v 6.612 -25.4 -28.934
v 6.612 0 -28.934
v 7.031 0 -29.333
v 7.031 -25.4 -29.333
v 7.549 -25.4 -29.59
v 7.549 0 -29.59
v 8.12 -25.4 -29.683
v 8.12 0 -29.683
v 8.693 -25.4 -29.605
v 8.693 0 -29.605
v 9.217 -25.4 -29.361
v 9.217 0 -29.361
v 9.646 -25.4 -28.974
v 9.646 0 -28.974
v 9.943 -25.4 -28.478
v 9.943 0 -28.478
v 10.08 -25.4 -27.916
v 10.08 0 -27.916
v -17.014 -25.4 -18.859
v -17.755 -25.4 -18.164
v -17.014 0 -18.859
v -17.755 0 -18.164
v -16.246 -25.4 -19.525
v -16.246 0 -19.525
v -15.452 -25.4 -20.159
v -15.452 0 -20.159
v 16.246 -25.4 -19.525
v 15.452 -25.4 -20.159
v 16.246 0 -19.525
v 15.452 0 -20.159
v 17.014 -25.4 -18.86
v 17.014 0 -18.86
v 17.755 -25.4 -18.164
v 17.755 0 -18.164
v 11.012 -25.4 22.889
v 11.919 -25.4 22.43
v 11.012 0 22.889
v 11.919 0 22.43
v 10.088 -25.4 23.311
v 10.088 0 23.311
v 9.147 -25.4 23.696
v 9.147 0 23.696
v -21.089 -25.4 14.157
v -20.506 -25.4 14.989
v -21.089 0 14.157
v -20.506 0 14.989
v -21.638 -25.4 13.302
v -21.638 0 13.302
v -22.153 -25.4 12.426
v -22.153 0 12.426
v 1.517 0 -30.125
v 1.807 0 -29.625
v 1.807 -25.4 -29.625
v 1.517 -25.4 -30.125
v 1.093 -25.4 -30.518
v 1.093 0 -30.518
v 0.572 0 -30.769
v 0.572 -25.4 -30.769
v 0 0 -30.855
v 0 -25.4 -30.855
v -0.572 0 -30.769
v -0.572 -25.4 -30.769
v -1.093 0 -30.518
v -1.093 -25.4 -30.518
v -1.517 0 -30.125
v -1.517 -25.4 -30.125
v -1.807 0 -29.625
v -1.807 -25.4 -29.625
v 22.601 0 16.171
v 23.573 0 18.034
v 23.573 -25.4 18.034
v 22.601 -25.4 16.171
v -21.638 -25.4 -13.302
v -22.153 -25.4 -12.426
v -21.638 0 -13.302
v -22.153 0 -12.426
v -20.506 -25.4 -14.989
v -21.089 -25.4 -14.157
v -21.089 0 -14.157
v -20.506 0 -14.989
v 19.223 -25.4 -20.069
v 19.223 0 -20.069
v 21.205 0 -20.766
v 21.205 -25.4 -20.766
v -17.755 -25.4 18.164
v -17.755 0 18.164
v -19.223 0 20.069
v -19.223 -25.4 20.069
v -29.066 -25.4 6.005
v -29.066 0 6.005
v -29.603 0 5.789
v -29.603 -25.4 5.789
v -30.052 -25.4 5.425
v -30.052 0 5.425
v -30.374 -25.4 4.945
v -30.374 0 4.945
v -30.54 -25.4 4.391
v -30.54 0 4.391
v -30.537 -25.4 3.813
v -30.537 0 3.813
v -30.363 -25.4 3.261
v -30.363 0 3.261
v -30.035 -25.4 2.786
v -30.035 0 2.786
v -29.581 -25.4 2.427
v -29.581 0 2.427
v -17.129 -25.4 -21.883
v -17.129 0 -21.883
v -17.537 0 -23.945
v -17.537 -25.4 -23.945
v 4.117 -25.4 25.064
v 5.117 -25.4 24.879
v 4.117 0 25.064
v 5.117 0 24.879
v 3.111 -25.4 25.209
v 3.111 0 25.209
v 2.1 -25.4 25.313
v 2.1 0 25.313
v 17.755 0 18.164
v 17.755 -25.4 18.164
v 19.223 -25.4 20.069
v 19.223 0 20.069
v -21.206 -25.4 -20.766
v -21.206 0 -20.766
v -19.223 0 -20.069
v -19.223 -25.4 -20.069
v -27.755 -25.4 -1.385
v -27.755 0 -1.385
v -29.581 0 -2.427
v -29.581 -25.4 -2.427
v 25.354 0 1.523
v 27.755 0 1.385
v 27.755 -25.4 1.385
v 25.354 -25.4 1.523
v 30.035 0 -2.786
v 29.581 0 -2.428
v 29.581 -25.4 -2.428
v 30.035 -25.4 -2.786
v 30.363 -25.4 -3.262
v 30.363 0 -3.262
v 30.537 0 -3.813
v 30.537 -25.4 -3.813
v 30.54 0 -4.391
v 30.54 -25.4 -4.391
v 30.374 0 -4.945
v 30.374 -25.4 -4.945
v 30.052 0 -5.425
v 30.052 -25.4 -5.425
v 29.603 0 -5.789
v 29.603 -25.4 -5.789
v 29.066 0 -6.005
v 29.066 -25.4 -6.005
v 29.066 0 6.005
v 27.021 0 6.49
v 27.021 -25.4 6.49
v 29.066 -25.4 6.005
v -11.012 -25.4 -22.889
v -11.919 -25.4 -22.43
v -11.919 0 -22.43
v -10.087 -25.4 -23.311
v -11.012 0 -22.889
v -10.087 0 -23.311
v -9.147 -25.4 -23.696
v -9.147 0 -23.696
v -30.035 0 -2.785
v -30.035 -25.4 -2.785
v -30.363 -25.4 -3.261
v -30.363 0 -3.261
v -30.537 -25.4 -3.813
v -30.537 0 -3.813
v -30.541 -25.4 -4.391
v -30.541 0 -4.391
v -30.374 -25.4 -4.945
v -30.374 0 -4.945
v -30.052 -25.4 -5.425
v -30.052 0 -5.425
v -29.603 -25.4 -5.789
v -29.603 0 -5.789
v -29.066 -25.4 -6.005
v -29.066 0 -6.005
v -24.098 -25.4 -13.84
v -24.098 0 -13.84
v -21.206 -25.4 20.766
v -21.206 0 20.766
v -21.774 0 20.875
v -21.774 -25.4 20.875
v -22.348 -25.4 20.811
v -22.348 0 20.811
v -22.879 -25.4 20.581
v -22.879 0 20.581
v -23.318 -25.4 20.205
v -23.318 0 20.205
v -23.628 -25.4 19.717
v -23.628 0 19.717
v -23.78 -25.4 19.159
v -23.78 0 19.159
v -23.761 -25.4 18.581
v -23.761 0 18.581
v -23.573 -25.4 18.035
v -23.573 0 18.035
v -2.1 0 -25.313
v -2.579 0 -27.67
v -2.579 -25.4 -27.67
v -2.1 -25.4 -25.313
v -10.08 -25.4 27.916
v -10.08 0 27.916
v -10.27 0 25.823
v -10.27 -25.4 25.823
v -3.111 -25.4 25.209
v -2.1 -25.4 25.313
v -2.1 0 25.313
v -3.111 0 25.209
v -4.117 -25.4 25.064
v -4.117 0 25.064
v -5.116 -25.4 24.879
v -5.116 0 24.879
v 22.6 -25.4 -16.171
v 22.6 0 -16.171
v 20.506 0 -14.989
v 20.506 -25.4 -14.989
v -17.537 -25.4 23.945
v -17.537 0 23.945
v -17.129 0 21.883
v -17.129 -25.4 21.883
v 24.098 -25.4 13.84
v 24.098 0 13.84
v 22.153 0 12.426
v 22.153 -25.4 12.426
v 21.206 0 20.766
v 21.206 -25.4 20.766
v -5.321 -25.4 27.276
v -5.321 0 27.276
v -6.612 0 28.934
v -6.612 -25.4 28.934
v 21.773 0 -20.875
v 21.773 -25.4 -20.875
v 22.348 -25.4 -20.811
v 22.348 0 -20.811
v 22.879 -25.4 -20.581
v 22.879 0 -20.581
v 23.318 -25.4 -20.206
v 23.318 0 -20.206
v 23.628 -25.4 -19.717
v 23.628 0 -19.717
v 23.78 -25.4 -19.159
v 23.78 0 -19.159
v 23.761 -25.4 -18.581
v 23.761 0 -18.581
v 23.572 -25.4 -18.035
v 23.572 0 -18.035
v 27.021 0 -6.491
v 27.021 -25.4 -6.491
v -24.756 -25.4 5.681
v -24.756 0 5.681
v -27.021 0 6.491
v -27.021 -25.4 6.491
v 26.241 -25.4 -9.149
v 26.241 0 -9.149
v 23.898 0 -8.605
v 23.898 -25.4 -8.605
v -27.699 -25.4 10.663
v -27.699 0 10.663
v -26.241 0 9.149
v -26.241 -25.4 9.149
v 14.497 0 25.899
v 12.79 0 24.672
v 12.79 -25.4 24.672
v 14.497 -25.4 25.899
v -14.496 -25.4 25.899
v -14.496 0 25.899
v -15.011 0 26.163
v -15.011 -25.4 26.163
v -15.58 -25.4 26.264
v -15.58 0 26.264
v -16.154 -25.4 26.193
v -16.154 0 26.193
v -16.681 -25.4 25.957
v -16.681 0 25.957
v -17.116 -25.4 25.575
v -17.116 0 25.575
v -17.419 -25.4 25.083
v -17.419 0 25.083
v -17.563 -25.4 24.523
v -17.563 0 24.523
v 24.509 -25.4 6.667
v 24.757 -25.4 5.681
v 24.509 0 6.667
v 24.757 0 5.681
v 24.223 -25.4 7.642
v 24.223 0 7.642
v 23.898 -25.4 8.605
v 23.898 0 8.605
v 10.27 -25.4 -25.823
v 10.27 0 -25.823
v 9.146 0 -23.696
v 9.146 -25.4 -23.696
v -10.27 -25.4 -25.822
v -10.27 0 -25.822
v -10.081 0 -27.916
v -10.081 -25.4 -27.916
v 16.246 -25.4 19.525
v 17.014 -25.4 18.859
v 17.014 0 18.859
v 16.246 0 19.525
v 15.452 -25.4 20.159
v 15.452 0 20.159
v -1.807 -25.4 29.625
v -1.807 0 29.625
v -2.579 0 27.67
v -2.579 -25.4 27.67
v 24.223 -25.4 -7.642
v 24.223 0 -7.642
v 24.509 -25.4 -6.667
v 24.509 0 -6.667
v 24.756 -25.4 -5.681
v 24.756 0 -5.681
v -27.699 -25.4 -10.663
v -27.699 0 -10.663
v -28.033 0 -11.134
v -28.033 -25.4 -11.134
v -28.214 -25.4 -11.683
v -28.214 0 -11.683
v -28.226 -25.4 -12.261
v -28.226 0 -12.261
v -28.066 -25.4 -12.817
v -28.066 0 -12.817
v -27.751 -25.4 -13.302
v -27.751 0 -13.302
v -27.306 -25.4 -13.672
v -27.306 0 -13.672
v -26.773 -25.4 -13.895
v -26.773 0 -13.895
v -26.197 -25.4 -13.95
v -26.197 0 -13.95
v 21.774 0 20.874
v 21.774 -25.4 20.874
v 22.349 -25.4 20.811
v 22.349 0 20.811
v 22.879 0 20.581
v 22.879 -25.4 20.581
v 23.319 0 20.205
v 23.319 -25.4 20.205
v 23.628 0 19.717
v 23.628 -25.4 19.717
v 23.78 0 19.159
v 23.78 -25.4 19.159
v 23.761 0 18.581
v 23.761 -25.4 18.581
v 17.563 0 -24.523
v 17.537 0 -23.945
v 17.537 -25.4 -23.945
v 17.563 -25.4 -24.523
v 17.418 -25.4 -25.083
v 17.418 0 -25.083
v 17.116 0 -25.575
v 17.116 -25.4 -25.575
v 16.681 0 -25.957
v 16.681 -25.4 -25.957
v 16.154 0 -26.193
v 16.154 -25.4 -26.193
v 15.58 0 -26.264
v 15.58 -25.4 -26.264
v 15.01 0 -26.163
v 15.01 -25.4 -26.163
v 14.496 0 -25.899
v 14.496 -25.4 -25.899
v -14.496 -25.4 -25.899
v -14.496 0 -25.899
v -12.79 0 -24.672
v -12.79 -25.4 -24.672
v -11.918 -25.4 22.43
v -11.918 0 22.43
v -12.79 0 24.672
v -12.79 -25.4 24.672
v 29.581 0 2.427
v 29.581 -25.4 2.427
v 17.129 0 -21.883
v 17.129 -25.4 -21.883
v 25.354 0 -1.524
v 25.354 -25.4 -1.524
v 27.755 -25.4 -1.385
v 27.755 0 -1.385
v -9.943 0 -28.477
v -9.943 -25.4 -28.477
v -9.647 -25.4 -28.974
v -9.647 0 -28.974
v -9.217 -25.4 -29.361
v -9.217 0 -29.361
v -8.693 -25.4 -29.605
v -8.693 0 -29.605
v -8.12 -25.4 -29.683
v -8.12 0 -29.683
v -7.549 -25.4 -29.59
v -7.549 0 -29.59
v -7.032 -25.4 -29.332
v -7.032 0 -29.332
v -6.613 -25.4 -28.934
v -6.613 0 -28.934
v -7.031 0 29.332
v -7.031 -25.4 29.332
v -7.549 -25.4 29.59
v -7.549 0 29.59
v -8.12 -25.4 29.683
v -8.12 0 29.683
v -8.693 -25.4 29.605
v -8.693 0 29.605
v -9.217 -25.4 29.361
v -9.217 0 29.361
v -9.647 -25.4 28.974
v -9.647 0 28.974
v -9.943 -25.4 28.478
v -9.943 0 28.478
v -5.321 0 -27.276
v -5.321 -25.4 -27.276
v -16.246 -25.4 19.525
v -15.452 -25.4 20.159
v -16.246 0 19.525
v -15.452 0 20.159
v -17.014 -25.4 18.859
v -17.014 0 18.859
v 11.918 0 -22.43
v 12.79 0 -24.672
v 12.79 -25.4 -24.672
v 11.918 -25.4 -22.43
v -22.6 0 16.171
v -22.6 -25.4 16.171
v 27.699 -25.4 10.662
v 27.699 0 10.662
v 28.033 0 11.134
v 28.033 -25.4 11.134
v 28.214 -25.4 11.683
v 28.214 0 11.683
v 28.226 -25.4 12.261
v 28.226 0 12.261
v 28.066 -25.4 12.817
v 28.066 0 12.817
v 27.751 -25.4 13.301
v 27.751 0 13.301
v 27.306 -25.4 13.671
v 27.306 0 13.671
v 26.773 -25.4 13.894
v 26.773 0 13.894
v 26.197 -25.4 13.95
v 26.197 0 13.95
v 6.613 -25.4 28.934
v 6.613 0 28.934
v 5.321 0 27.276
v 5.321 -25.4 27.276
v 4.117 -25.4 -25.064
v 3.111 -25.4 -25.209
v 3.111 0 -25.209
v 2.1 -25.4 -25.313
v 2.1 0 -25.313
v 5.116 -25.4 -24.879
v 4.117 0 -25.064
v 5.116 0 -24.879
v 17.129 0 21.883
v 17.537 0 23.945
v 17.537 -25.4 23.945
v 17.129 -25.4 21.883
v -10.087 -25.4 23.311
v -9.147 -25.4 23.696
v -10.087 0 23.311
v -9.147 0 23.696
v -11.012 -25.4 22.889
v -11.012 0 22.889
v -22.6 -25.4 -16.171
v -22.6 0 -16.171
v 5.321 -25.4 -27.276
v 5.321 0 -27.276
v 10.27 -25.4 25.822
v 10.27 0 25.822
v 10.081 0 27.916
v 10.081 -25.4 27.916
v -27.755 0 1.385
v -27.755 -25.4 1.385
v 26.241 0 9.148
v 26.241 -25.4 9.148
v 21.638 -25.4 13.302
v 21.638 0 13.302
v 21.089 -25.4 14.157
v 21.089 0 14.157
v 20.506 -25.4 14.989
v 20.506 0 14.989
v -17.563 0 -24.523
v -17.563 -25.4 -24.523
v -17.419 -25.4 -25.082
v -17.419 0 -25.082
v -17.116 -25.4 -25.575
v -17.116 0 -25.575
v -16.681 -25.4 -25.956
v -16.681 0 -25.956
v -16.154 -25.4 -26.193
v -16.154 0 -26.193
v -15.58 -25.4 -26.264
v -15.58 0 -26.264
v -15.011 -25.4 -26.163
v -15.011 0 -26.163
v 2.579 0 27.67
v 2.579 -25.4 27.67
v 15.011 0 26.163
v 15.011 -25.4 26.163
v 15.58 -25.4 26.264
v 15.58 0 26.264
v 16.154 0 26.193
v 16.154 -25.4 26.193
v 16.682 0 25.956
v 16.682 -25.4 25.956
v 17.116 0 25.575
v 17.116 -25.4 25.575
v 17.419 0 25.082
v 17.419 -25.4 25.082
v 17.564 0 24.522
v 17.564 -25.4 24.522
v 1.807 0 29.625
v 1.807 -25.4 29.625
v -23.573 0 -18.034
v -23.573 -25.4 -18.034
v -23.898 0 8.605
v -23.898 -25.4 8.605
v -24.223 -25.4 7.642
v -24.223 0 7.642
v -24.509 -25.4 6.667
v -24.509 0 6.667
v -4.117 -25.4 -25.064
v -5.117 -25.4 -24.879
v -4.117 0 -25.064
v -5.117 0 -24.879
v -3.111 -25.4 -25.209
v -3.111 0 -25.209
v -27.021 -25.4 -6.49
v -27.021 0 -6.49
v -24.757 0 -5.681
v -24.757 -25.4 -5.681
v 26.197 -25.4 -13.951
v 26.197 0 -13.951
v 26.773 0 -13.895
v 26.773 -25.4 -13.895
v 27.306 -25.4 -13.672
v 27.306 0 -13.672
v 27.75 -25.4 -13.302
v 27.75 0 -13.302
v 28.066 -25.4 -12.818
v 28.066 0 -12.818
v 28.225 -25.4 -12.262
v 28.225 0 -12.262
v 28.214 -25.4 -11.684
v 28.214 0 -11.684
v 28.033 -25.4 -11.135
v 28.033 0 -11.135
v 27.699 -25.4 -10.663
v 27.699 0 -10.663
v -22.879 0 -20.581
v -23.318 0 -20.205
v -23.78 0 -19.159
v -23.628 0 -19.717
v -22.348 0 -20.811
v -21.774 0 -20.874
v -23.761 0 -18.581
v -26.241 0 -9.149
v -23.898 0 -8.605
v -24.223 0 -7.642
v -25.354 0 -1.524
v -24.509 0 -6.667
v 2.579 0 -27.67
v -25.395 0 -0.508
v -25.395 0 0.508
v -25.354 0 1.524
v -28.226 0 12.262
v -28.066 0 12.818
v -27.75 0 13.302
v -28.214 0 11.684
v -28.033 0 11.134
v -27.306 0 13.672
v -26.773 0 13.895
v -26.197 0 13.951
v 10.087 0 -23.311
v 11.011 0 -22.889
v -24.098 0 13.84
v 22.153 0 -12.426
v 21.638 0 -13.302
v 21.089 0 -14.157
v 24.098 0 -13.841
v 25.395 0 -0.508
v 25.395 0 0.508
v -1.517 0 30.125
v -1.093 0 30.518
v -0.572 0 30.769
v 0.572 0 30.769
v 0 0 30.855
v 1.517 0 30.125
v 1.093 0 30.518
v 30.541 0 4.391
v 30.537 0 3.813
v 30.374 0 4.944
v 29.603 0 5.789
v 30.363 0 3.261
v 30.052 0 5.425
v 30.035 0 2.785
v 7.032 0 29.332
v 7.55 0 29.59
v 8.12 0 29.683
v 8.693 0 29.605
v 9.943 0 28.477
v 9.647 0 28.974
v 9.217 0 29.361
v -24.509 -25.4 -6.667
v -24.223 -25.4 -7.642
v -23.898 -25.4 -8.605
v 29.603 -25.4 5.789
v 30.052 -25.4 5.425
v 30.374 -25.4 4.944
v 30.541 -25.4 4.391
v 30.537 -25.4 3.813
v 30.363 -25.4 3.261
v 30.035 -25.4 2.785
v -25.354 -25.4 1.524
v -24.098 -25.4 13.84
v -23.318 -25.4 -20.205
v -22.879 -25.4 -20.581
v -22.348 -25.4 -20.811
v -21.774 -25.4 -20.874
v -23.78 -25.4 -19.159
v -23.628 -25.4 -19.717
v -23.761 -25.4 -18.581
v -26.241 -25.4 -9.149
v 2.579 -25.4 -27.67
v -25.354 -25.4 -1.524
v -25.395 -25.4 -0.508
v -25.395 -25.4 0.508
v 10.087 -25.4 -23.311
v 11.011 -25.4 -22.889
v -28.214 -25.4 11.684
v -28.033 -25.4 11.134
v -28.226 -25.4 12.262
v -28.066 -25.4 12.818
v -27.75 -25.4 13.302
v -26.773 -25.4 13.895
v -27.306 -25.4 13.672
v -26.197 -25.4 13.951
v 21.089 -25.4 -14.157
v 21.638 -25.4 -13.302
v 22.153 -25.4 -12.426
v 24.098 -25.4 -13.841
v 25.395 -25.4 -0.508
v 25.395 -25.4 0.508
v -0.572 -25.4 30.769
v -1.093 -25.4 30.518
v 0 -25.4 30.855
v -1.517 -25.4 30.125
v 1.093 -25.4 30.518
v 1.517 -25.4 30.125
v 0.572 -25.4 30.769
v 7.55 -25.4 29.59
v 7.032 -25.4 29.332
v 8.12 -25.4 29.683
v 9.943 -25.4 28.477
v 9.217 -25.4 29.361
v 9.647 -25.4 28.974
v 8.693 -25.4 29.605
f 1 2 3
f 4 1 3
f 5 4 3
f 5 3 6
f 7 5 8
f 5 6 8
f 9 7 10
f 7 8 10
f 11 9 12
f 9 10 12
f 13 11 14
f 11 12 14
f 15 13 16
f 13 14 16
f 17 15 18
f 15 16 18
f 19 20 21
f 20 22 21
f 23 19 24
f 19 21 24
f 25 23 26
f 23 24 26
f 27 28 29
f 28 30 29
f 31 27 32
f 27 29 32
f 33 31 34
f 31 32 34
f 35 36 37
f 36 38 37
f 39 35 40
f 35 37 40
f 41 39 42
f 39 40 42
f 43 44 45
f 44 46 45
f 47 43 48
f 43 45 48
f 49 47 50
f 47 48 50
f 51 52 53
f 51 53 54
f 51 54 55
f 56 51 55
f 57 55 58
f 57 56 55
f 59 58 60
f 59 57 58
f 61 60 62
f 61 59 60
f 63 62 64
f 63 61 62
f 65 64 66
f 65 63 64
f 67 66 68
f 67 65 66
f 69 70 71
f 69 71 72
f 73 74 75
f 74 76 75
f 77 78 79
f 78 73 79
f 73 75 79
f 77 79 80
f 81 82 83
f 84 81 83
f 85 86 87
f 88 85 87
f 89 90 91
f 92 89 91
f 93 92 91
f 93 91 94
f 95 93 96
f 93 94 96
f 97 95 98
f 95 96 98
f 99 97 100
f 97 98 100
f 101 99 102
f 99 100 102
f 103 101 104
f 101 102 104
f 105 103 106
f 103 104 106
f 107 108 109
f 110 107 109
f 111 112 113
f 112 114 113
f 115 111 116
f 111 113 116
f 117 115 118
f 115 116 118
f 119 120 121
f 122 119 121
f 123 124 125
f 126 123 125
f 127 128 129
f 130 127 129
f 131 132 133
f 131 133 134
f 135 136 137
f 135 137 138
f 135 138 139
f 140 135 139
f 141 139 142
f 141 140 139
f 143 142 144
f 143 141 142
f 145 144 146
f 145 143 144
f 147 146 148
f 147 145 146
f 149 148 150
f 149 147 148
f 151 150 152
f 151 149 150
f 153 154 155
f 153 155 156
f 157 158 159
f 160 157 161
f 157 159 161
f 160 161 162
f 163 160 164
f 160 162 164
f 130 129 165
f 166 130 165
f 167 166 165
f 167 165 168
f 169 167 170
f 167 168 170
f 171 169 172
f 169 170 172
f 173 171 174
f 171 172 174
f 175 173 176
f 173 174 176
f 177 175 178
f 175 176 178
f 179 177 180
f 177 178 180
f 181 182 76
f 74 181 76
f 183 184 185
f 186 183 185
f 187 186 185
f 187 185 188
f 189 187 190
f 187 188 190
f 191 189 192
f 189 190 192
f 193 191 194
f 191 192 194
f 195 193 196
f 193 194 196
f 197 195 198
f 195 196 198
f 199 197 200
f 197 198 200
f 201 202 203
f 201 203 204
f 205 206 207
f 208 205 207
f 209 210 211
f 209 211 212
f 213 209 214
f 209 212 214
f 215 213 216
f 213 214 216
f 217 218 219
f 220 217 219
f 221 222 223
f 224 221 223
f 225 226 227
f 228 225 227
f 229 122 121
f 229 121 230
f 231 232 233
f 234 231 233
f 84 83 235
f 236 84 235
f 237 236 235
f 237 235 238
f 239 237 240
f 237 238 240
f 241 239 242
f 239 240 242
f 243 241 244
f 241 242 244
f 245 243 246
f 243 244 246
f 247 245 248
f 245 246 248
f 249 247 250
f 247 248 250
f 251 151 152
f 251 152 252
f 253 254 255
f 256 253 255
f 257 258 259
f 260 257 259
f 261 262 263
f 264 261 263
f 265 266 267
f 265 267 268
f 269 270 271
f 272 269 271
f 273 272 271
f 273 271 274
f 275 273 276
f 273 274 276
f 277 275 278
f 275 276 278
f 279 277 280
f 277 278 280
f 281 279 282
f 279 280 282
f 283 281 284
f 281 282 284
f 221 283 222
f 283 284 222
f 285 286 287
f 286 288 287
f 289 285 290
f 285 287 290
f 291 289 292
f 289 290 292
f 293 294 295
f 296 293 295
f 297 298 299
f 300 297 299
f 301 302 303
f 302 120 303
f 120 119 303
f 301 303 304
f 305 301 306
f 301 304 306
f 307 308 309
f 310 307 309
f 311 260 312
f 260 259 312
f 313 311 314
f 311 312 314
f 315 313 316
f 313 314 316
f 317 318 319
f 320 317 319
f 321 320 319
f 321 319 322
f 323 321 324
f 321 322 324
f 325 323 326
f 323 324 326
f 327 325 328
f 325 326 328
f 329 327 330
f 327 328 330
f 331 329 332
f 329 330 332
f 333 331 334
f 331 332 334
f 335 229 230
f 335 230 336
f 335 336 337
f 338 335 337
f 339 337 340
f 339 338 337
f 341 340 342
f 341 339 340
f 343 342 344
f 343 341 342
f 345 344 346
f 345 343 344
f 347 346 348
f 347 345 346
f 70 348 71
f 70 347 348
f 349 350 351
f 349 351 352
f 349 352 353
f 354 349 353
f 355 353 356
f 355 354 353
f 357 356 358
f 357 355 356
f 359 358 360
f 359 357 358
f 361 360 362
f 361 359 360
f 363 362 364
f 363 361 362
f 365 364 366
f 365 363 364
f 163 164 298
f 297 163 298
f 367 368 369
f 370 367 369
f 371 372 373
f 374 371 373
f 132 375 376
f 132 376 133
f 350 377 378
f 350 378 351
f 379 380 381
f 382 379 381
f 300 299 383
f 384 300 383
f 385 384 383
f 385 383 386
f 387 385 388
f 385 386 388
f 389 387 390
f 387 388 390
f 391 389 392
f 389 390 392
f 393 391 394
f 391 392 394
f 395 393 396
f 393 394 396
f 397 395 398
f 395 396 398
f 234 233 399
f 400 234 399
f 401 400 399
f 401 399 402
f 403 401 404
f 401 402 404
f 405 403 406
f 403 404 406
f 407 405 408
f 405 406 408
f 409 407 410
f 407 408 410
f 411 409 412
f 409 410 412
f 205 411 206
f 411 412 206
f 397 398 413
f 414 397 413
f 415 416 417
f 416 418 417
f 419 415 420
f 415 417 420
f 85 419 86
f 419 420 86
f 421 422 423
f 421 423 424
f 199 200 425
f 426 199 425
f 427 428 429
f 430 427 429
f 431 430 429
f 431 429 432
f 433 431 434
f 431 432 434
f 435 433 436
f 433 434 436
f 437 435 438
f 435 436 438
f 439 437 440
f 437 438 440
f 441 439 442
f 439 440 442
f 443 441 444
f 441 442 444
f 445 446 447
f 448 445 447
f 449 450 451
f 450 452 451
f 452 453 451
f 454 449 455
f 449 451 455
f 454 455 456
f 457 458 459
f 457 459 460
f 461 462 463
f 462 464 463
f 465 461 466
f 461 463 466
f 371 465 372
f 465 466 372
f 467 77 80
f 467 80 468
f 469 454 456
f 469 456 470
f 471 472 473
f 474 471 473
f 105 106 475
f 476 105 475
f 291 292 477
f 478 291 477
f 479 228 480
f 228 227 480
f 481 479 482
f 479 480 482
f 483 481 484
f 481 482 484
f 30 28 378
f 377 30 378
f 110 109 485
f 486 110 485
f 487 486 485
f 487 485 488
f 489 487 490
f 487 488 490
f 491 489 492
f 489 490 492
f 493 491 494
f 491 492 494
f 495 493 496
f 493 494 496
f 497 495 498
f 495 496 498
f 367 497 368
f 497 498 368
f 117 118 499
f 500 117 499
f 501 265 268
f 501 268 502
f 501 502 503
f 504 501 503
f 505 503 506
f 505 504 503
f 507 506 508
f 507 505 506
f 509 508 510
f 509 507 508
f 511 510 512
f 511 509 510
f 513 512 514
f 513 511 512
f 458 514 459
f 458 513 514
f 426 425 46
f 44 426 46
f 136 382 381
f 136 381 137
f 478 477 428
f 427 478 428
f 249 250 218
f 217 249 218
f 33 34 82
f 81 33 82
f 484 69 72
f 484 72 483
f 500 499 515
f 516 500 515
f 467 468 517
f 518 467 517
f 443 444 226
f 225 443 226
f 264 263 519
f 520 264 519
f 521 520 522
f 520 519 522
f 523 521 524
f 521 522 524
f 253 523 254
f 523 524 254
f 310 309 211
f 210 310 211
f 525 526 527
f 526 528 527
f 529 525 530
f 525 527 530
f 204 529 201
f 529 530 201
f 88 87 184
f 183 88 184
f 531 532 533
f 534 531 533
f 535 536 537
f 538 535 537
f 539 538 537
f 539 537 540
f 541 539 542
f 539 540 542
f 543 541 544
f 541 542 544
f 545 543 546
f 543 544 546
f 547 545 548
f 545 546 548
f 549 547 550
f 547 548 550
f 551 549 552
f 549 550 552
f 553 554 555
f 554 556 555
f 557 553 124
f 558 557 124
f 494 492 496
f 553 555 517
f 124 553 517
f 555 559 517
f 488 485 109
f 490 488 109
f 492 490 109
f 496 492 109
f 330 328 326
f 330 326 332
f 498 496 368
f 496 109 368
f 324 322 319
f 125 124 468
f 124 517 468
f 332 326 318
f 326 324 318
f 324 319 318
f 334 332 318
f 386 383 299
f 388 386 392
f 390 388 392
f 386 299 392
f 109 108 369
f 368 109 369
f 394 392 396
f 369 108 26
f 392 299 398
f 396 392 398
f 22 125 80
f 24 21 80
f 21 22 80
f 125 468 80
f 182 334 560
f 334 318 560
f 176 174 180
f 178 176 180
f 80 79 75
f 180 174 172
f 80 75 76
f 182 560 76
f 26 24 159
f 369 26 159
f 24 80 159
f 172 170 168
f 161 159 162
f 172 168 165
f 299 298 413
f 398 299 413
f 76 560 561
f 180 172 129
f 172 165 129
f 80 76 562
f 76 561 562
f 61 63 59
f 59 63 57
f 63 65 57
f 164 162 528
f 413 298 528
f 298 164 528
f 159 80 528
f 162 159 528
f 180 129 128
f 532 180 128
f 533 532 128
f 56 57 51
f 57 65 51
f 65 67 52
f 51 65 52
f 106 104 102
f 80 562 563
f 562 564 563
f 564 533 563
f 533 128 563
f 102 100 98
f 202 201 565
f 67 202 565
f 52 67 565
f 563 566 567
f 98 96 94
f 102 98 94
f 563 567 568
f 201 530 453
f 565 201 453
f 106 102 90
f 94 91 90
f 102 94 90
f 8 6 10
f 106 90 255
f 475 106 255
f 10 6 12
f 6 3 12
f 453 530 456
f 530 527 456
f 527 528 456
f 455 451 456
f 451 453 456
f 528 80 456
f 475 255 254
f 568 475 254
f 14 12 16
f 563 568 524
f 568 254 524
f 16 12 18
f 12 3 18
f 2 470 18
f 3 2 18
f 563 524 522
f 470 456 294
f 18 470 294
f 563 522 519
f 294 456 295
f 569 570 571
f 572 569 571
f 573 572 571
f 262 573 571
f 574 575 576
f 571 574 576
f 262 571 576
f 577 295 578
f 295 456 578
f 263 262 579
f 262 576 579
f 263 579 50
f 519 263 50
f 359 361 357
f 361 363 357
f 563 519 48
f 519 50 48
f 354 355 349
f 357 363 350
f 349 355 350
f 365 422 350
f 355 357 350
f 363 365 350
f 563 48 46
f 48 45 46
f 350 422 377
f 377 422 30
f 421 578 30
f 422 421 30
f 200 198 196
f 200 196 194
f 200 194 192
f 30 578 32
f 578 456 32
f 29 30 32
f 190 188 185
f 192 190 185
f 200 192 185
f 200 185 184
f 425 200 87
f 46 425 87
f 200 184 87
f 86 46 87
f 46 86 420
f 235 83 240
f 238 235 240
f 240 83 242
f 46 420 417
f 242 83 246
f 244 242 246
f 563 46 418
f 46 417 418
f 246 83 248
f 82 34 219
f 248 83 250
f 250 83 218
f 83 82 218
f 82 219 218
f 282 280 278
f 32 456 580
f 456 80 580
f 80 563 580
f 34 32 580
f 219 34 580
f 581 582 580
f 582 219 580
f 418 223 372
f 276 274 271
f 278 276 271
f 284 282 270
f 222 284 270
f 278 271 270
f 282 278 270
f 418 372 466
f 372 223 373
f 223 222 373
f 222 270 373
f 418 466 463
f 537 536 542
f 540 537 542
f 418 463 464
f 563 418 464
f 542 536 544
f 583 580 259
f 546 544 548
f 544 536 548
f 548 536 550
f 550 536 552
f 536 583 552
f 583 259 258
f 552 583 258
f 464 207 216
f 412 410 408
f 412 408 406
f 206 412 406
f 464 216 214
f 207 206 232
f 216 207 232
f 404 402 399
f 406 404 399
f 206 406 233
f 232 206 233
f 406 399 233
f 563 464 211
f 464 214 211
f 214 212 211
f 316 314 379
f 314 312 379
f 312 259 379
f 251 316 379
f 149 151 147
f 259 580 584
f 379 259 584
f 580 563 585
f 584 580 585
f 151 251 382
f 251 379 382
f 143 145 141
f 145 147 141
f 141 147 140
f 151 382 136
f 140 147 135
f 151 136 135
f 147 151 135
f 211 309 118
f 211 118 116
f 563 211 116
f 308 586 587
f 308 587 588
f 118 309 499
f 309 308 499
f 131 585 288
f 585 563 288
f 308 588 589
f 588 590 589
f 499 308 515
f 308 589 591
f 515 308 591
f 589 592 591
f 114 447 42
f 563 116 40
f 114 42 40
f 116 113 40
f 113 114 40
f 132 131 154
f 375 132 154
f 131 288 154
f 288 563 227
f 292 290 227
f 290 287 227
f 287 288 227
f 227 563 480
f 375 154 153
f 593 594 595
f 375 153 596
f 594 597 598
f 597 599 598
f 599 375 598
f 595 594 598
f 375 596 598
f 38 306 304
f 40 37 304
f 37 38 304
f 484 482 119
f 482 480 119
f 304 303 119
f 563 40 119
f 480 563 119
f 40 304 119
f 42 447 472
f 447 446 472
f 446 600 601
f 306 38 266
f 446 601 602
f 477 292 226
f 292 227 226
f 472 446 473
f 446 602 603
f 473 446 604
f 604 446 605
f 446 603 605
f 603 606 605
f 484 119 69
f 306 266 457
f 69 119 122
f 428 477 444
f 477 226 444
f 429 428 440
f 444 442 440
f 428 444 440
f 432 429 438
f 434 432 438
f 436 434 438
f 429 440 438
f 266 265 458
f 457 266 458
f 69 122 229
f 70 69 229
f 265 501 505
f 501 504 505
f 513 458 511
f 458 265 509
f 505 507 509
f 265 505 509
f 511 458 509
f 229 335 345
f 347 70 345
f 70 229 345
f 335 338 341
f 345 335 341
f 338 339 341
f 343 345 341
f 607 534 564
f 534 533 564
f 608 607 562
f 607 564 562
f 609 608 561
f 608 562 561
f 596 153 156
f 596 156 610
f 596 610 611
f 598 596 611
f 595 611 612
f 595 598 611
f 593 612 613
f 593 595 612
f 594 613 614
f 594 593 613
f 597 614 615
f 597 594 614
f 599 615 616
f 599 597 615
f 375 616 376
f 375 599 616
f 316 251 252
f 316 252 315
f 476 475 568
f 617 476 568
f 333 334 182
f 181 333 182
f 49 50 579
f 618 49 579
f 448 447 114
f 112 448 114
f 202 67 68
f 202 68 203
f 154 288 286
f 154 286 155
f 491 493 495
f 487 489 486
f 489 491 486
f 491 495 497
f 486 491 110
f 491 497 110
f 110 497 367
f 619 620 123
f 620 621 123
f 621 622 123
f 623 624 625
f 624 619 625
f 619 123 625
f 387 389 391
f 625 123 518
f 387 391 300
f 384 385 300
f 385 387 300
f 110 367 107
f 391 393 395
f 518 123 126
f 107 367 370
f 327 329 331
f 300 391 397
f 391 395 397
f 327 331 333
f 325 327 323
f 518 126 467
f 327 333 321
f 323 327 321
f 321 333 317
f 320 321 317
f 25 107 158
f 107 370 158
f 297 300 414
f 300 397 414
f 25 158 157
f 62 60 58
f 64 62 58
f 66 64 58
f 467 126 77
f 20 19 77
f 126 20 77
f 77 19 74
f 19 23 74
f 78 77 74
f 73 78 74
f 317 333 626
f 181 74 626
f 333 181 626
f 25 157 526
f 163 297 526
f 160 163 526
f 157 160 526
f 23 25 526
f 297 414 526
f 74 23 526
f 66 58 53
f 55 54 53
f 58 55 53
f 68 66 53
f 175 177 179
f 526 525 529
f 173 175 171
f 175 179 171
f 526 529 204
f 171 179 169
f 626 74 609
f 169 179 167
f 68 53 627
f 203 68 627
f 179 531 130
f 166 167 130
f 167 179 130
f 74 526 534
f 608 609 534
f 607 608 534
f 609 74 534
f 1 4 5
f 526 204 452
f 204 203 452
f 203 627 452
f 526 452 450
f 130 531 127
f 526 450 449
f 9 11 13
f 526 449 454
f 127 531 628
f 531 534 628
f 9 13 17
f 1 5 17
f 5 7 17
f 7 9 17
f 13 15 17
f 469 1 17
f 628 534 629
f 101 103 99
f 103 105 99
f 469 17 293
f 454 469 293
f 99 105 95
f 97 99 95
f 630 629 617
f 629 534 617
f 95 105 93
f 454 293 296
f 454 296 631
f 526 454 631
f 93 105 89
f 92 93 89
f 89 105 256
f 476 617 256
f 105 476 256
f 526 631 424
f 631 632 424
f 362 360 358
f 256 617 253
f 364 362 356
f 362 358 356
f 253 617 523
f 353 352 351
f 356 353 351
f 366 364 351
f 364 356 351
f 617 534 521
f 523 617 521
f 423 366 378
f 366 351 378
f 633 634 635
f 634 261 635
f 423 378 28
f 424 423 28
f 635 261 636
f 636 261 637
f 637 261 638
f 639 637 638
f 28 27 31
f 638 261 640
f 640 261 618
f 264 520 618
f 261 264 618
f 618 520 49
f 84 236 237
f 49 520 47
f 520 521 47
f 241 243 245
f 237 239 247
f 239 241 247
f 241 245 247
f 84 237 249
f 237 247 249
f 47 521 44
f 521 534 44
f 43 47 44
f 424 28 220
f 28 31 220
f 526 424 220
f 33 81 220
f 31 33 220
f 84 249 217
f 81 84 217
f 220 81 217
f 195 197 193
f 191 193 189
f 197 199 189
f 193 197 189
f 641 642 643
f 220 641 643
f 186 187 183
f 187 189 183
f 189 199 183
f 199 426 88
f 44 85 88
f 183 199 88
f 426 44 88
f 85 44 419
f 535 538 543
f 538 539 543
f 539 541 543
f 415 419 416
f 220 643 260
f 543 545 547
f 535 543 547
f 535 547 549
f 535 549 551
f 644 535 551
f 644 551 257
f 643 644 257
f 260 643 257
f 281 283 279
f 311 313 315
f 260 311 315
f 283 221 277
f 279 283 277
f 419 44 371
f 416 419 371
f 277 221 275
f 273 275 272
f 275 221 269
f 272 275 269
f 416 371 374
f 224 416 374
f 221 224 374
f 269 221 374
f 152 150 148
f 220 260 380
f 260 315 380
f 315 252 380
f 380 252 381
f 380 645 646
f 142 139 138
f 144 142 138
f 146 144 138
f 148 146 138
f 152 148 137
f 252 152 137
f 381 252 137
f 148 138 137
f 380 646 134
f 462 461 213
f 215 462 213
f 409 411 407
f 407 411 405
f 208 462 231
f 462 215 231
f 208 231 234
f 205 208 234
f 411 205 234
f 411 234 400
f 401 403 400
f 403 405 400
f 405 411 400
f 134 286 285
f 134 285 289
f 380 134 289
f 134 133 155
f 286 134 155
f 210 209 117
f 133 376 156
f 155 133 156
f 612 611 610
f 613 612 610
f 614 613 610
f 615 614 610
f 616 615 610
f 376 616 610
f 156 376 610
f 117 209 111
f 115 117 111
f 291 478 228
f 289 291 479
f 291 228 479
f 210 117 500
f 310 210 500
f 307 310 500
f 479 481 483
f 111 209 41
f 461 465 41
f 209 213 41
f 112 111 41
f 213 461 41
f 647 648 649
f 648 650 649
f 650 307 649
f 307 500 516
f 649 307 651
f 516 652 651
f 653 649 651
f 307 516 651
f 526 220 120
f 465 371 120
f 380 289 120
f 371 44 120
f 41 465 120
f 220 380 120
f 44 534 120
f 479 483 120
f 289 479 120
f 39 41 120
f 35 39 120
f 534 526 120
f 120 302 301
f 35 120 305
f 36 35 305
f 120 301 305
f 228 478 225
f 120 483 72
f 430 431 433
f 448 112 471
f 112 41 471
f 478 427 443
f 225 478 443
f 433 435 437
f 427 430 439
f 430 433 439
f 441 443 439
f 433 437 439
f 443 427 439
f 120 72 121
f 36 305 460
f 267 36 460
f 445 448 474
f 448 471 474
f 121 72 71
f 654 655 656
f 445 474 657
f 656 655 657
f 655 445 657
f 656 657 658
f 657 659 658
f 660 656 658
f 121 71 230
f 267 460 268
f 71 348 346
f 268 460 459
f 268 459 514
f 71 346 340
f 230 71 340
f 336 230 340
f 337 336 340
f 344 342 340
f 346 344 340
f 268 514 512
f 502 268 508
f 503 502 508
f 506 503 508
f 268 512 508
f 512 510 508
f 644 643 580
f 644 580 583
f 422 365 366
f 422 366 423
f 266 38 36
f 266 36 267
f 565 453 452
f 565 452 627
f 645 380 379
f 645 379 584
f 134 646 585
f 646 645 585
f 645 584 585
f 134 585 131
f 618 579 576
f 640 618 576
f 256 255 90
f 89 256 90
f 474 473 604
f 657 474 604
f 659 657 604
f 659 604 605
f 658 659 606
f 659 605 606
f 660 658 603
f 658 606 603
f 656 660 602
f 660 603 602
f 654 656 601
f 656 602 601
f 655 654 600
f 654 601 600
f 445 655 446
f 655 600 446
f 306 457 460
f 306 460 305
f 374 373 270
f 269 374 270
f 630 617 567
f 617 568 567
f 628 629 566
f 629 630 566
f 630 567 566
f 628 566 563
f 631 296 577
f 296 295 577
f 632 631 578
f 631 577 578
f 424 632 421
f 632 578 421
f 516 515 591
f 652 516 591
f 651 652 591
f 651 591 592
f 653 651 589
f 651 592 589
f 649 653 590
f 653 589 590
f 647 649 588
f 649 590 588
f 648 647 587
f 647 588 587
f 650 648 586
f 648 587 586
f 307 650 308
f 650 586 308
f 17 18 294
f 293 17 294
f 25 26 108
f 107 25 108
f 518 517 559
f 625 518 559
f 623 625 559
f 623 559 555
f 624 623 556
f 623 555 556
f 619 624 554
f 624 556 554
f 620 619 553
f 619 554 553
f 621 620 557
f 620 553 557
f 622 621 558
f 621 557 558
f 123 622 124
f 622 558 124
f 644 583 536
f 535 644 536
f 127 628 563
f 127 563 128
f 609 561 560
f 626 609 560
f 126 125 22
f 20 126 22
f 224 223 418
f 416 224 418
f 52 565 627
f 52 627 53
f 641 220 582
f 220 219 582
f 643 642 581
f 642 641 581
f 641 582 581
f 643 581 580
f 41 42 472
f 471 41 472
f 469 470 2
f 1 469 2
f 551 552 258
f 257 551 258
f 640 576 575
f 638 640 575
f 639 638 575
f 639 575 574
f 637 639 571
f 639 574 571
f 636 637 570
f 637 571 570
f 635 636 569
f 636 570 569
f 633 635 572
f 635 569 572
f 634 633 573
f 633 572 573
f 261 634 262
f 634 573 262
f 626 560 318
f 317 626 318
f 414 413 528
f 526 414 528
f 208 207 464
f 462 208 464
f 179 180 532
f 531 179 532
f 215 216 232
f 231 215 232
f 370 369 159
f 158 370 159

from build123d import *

# Parameters (mm, degrees)
F0_R             = 25.4
F1_DEPTH         = 25.4
F4_DEPTH         = 25.4
F4_COPIES_COUNT  = 8
F4_COPIES_ANGLE  = 343.6356
F4_COPIES1_COUNT = 3
F4_COPIES1_ANGLE = 32.7272727273
F4_COPIES2_COUNT = 3
F4_COPIES2_ANGLE = 130.9088
F4_COPIES3_COUNT = 3
F4_COPIES3_ANGLE = 163.636
F4_COPIES4_COUNT = 3
F4_COPIES4_ANGLE = 229.0904


# Not quite as in the source:
# - a pattern or mirror of a feature is missing from the dataset's text; its kind, count and spacing are read off the source's solid


with BuildPart() as f1:
    # F0 (on Front) → F1 (new body)
    with BuildSketch(Plane.XZ):
        Circle(F0_R)
    extrude(amount=F1_DEPTH)

    # F3 (on Front) → F4 (join)
    with BuildSketch(Plane.XZ):
        with BuildLine():
            ThreePointArc((-2.0394499691, 25.0140055699), (0, 25.0970084039), (2.0394499691, 25.0140055699))
            Line((2.0394499691, 25.0140055699), (2.5789397816, 27.6699554159))
            Line((2.5789397816, 27.6699554159), (1.8071979284, 29.6250353105))
            ThreePointArc((1.8071979284, 29.6250353105), (0, 30.8545671303), (-1.8071979284, 29.6250353105))
            Line((-1.8071979284, 29.6250353105), (-2.5789397816, 27.6699554159))
            Line((-2.5789397816, 27.6699554159), (-2.0394499691, 25.0140055699))
        make_face()
    f4 = extrude(amount=F4_DEPTH)

    # F4_copies: F4 ×8 about axis
    f4_copies_axis = Axis((0, 0, 0), (0, -1, 0))
    for i in range(1, F4_COPIES_COUNT):
        add(f4.rotate(f4_copies_axis, i * F4_COPIES_ANGLE / (F4_COPIES_COUNT - 1)))

    # F4_copies1: F4 ×3 about axis
    f4_copies1_axis = Axis((0, 0, 0), (0, -1, 0))
    for i in range(1, F4_COPIES1_COUNT):
        add(f4.rotate(f4_copies1_axis, i * F4_COPIES1_ANGLE / (F4_COPIES1_COUNT - 1)))

    # F4_copies2: F4 ×3 about axis
    f4_copies2_axis = Axis((0, 0, 0), (0, -1, 0))
    for i in range(1, F4_COPIES2_COUNT):
        add(f4.rotate(f4_copies2_axis, i * F4_COPIES2_ANGLE / (F4_COPIES2_COUNT - 1)))

    # F4_copies3: F4 ×3 about axis
    f4_copies3_axis = Axis((0, 0, 0), (0, -1, 0))
    for i in range(1, F4_COPIES3_COUNT):
        add(f4.rotate(f4_copies3_axis, i * F4_COPIES3_ANGLE / (F4_COPIES3_COUNT - 1)))

    # F4_copies4: F4 ×3 about axis
    f4_copies4_axis = Axis((0, 0, 0), (0, -1, 0))
    for i in range(1, F4_COPIES4_COUNT):
        add(f4.rotate(f4_copies4_axis, i * F4_COPIES4_ANGLE / (F4_COPIES4_COUNT - 1)))

    # F4_copies5: F4 across plane
    add(f4.mirror(Plane(origin=(0, 0, 0), x_dir=(-0.7557528993, 0, -0.6548568968), z_dir=(0.6548568968, 0, -0.7557528993))))

    # F4_copies6: F4 across plane
    add(f4.mirror(Plane(origin=(0, 0, 0), x_dir=(-0.9594941358, 0, -0.2817285986), z_dir=(0.2817285986, 0, -0.9594941358))))

    # F4_copies7: F4 across plane
    add(f4.mirror(Plane(origin=(0, 0, 0), x_dir=(-1, 0, 1e-06), z_dir=(-1e-06, 0, -1))))

    # F4_copies8: F4 across plane
    add(f4.mirror(Plane(origin=(0, 0, 0), x_dir=(0.4154204975, 0, 0.9096294907), z_dir=(0.9096294907, 0, -0.4154204975))))

    # F4_copies9: F4 across plane
    add(f4.mirror(Plane(origin=(0, 0, 0), x_dir=(0.6548648109, 0, 0.7557460416), z_dir=(0.7557460416, 0, -0.6548648109))))

    # F4_copies10: F4 across plane
    add(f4.mirror(Plane(origin=(0, 0, 0), x_dir=(0.2817386464, 0, 0.9594911855), z_dir=(0.9594911855, 0, -0.2817386464))))


solid = f1.part
